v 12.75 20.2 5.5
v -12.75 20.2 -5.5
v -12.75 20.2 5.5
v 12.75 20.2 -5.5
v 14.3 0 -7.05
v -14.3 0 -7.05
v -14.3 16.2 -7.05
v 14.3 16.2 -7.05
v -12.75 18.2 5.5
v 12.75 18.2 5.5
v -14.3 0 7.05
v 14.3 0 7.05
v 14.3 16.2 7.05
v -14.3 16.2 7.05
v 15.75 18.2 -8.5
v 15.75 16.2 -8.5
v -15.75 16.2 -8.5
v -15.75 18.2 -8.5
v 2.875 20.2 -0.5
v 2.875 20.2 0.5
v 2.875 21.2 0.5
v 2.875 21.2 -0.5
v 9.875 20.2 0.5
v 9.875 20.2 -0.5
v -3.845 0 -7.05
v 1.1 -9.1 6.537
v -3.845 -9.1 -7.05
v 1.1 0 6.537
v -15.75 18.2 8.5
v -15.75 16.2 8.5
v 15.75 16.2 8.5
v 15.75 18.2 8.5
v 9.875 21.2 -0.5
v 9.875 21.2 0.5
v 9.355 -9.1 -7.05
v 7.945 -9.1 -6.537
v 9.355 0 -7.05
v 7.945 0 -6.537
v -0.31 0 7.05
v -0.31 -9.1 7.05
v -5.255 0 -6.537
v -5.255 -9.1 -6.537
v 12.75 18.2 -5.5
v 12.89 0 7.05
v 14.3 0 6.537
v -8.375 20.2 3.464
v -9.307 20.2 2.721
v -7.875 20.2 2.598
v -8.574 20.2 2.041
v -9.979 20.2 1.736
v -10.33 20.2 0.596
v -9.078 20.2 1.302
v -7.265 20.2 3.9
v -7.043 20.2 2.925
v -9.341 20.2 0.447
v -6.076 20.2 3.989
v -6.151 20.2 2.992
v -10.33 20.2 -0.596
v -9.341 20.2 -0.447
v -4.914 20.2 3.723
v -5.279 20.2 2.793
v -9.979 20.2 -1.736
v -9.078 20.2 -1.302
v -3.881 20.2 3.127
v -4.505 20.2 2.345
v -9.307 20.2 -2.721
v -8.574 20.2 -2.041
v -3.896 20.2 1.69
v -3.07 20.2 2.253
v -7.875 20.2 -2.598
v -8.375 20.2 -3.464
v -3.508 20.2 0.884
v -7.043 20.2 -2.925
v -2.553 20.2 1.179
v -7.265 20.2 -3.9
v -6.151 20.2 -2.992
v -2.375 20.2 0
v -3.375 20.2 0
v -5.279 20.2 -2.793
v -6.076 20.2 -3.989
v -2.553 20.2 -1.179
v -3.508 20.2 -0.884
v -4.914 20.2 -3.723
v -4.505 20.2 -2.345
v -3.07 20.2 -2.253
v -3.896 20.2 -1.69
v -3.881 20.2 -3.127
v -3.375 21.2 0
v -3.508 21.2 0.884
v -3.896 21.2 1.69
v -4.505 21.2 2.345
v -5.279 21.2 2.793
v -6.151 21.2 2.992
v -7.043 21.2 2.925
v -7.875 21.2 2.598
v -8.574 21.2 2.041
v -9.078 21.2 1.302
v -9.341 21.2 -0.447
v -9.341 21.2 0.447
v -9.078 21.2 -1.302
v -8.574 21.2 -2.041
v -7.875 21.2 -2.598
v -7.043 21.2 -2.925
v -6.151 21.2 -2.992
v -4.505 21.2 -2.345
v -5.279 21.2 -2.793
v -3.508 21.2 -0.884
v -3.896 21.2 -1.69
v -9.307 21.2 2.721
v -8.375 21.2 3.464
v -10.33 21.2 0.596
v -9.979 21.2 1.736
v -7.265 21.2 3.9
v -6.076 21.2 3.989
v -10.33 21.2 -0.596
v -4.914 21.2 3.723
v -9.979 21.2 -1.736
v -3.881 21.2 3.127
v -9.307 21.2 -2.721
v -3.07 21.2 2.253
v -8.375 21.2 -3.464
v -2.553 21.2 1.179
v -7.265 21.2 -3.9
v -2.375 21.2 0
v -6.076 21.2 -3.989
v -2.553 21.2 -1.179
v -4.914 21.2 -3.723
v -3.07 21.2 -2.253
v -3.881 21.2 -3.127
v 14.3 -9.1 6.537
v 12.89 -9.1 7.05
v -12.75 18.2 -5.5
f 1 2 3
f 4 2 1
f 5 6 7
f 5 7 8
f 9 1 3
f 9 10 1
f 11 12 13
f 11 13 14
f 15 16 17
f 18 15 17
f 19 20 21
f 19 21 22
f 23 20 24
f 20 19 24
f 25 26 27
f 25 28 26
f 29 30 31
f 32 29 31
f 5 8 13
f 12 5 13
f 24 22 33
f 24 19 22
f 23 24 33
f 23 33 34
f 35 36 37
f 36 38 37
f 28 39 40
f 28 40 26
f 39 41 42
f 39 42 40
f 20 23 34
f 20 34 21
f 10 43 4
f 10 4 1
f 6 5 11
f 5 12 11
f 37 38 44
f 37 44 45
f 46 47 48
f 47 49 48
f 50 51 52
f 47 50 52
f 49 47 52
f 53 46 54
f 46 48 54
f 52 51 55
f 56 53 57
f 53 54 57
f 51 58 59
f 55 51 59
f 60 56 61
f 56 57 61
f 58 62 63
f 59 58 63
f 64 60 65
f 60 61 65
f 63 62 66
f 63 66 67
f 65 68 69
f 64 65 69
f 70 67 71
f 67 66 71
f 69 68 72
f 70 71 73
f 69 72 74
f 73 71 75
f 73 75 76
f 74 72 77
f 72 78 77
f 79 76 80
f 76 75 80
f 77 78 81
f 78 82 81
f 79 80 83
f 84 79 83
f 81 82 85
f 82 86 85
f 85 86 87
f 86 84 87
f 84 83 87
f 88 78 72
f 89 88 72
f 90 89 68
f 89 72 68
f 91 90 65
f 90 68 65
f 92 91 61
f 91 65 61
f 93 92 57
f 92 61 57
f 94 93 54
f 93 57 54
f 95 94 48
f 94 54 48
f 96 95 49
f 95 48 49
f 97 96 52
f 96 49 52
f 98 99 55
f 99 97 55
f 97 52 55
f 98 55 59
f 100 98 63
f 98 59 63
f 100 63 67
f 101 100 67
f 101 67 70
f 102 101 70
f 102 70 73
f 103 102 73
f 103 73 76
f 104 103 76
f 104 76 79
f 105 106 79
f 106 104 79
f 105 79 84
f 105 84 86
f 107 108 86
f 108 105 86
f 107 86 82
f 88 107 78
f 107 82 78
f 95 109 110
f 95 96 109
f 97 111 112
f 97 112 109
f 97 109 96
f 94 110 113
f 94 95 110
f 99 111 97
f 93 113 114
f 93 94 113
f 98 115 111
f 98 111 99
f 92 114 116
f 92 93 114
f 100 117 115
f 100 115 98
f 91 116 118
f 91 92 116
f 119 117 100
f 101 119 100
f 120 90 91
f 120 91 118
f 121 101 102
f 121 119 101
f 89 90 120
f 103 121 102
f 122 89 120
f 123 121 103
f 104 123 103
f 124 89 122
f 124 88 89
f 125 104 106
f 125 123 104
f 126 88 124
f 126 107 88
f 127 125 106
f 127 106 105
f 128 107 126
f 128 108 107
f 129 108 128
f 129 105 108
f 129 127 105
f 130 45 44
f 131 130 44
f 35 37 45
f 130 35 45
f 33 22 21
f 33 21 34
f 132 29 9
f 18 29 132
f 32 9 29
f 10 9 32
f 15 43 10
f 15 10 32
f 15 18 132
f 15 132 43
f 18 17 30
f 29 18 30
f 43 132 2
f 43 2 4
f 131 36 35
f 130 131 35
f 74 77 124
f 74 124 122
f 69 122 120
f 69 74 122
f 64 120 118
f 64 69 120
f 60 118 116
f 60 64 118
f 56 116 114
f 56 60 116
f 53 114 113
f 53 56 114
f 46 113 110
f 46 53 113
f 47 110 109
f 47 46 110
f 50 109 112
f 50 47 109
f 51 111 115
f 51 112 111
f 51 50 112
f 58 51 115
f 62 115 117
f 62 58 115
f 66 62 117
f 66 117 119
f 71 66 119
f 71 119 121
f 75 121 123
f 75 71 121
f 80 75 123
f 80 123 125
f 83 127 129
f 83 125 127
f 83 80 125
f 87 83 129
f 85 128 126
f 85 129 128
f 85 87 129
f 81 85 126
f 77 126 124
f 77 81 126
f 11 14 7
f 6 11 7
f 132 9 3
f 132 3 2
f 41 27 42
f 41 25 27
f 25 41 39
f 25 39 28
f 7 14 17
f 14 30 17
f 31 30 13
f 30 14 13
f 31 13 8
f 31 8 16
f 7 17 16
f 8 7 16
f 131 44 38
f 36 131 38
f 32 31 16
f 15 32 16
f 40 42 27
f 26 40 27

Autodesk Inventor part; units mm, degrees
ref_plane "YZ Plane" through (0, 0, 0) normal (1, 0, 0) x (0, 1, 0)
ref_plane "XZ Plane" through (0, 0, 0) normal (0, 1, 0) x (-1, 0, 0)
ref_plane "XY Plane" through (0, 0, 0) normal (0, 0, 1) x (1, 0, 0)
sketch "Sketch1" plane through (0, 0, 0) normal (0, 1, 0) x (-1, 0, 0)
  line L0 (-14.3, 7.05) -> (14.3, 7.05)
  line L1 (14.3, 7.05) -> (14.3, -7.05)
  line L2 (14.3, -7.05) -> (-14.3, -7.05)
  line L3 (-14.3, -7.05) -> (-14.3, 7.05)
  line L4 (-14.3, 7.05) -> (14.3, -7.05) construction
  line L5 (14.3, 7.05) -> (-14.3, -7.05) construction
  point P0 (0, 0)
  dimension "d0" = 28.6
  dimension "d1" = 14.1
extrude "Extrusion1" add sketch "Sketch1" along normal blind 16.2
sketch "Sketch2" plane through (0, 0, 0) normal (0, -1, 0) x (1, 0, 0)
  line L0 (9.3547, -7.05) -> (14.3, 6.537)
  line L1 (14.3, 6.537) -> (12.8905, 7.05)
  line L2 (12.8905, 7.05) -> (7.9452, -6.537)
  line L3 (7.9452, -6.537) -> (9.3547, -7.05)
  line L4 (9.3547, -7.05) -> (12.8905, 7.05) construction
  line L5 (14.3, 6.537) -> (7.9452, -6.537) construction
  line L6 (-14.3, -7.05) -> (-14.3, 7.05) construction
  line L7 (-14.3, 0) -> (14.3, 0) construction
  line L8 (14.3, 7.05) -> (14.3, -7.05) construction
  line L9 (14.3, 7.05) -> (-14.3, 7.05) construction
  line L10 (-14.3, -7.05) -> (14.3, -7.05) construction
  line L11 (14.3, -7.05) -> (14.3, 7.05) construction
  line L12 (-5.2548, -6.537) -> (-0.3095, 7.05)
  line L13 (-0.3095, 7.05) -> (1.1, 6.537)
  line L14 (1.1, 6.537) -> (-3.8453, -7.05)
  line L15 (-3.8453, -7.05) -> (-5.2548, -6.537)
  line L16 (-5.2548, -6.537) -> (1.1, 6.537) construction
  line L17 (-0.3095, 7.05) -> (-3.8453, -7.05) construction
  point P0 (0, 0)
  point P1 (11.1226, 0)
  point P2 (-2.0774, 0)
  dimension "d5" = 1.5
  dimension "d6" = 70
  dimension "d7" = 1.5
  dimension "d8" = 13.2
extrude "Extrusion2" add sketch "Sketch2" along normal blind 9.1 separate body
sketch "Sketch3" plane through (0, 16.2, 0) normal (0, 1, 0) x (1, 0, 0)
  line L0 (-15.75, -8.5) -> (15.75, -8.5)
  line L1 (15.75, -8.5) -> (15.75, 8.5)
  line L2 (15.75, 8.5) -> (-15.75, 8.5)
  line L3 (-15.75, 8.5) -> (-15.75, -8.5)
  line L4 (-15.75, -8.5) -> (15.75, 8.5) construction
  line L5 (15.75, -8.5) -> (-15.75, 8.5) construction
  point P0 (0, 0)
  dimension "d11" = 17
  dimension "d12" = 31.5
extrude "Extrusion3" add sketch "Sketch3" along normal blind 2 bodies 1
sketch "Sketch4" plane through (0, 18.2, 0) normal (0, 1, 0) x (1, 0, 0)
  line L0 (12.75, -5.5) -> (-12.75, -5.5)
  line L1 (-12.75, -5.5) -> (-12.75, 5.5)
  line L2 (-12.75, 5.5) -> (12.75, 5.5)
  line L3 (12.75, 5.5) -> (12.75, -5.5)
  line L4 (12.75, -5.5) -> (-12.75, 5.5) construction
  line L5 (-12.75, -5.5) -> (12.75, 5.5) construction
  line L6 (-15.75, 8.5) -> (-15.75, -8.5) projected
  line L7 (-15.75, -8.5) -> (15.75, -8.5) projected
  point P0 (0, 0)
  dimension "d15" = 3
  dimension "d16" = 3
extrude "Extrusion4" add sketch "Sketch4" along normal blind 2 bodies 1
sketch "Sketch5" plane through (0, 20.2, 0) normal (0, 1, 0) x (1, 0, 0)
  line L0 (-12.75, 5.5) -> (-12.75, -5.5) construction
  line L1 (-12.75, 0) -> (0, 0) construction
  line L2 (0, 0) -> (12.75, 0) construction
  line L3 (12.75, 5.5) -> (12.75, -5.5) construction
  circle A0 centre (-6.375, 0) radius 3
  circle A1 centre (-6.375, 0) radius 4
  line L4 (9.875, -0.5) -> (2.875, -0.5)
  line L5 (2.875, -0.5) -> (2.875, 0.5)
  line L6 (2.875, 0.5) -> (9.875, 0.5)
  line L7 (9.875, 0.5) -> (9.875, -0.5)
  line L8 (9.875, -0.5) -> (2.875, 0.5) construction
  line L9 (2.875, -0.5) -> (9.875, 0.5) construction
  point P0 (6.375, 0)
  dimension "d19" = 1
  dimension "d20" = 6
  dimension "d21" = 1
  dimension "d22" = 7
extrude "Extrusion5" add sketch "Sketch5" along normal blind 1 separate body
ref_plane "Work Plane1" through (0, 0, 7.05) normal (1, 0, 0) x (0, 0, -1)
properties part number "Switch"
